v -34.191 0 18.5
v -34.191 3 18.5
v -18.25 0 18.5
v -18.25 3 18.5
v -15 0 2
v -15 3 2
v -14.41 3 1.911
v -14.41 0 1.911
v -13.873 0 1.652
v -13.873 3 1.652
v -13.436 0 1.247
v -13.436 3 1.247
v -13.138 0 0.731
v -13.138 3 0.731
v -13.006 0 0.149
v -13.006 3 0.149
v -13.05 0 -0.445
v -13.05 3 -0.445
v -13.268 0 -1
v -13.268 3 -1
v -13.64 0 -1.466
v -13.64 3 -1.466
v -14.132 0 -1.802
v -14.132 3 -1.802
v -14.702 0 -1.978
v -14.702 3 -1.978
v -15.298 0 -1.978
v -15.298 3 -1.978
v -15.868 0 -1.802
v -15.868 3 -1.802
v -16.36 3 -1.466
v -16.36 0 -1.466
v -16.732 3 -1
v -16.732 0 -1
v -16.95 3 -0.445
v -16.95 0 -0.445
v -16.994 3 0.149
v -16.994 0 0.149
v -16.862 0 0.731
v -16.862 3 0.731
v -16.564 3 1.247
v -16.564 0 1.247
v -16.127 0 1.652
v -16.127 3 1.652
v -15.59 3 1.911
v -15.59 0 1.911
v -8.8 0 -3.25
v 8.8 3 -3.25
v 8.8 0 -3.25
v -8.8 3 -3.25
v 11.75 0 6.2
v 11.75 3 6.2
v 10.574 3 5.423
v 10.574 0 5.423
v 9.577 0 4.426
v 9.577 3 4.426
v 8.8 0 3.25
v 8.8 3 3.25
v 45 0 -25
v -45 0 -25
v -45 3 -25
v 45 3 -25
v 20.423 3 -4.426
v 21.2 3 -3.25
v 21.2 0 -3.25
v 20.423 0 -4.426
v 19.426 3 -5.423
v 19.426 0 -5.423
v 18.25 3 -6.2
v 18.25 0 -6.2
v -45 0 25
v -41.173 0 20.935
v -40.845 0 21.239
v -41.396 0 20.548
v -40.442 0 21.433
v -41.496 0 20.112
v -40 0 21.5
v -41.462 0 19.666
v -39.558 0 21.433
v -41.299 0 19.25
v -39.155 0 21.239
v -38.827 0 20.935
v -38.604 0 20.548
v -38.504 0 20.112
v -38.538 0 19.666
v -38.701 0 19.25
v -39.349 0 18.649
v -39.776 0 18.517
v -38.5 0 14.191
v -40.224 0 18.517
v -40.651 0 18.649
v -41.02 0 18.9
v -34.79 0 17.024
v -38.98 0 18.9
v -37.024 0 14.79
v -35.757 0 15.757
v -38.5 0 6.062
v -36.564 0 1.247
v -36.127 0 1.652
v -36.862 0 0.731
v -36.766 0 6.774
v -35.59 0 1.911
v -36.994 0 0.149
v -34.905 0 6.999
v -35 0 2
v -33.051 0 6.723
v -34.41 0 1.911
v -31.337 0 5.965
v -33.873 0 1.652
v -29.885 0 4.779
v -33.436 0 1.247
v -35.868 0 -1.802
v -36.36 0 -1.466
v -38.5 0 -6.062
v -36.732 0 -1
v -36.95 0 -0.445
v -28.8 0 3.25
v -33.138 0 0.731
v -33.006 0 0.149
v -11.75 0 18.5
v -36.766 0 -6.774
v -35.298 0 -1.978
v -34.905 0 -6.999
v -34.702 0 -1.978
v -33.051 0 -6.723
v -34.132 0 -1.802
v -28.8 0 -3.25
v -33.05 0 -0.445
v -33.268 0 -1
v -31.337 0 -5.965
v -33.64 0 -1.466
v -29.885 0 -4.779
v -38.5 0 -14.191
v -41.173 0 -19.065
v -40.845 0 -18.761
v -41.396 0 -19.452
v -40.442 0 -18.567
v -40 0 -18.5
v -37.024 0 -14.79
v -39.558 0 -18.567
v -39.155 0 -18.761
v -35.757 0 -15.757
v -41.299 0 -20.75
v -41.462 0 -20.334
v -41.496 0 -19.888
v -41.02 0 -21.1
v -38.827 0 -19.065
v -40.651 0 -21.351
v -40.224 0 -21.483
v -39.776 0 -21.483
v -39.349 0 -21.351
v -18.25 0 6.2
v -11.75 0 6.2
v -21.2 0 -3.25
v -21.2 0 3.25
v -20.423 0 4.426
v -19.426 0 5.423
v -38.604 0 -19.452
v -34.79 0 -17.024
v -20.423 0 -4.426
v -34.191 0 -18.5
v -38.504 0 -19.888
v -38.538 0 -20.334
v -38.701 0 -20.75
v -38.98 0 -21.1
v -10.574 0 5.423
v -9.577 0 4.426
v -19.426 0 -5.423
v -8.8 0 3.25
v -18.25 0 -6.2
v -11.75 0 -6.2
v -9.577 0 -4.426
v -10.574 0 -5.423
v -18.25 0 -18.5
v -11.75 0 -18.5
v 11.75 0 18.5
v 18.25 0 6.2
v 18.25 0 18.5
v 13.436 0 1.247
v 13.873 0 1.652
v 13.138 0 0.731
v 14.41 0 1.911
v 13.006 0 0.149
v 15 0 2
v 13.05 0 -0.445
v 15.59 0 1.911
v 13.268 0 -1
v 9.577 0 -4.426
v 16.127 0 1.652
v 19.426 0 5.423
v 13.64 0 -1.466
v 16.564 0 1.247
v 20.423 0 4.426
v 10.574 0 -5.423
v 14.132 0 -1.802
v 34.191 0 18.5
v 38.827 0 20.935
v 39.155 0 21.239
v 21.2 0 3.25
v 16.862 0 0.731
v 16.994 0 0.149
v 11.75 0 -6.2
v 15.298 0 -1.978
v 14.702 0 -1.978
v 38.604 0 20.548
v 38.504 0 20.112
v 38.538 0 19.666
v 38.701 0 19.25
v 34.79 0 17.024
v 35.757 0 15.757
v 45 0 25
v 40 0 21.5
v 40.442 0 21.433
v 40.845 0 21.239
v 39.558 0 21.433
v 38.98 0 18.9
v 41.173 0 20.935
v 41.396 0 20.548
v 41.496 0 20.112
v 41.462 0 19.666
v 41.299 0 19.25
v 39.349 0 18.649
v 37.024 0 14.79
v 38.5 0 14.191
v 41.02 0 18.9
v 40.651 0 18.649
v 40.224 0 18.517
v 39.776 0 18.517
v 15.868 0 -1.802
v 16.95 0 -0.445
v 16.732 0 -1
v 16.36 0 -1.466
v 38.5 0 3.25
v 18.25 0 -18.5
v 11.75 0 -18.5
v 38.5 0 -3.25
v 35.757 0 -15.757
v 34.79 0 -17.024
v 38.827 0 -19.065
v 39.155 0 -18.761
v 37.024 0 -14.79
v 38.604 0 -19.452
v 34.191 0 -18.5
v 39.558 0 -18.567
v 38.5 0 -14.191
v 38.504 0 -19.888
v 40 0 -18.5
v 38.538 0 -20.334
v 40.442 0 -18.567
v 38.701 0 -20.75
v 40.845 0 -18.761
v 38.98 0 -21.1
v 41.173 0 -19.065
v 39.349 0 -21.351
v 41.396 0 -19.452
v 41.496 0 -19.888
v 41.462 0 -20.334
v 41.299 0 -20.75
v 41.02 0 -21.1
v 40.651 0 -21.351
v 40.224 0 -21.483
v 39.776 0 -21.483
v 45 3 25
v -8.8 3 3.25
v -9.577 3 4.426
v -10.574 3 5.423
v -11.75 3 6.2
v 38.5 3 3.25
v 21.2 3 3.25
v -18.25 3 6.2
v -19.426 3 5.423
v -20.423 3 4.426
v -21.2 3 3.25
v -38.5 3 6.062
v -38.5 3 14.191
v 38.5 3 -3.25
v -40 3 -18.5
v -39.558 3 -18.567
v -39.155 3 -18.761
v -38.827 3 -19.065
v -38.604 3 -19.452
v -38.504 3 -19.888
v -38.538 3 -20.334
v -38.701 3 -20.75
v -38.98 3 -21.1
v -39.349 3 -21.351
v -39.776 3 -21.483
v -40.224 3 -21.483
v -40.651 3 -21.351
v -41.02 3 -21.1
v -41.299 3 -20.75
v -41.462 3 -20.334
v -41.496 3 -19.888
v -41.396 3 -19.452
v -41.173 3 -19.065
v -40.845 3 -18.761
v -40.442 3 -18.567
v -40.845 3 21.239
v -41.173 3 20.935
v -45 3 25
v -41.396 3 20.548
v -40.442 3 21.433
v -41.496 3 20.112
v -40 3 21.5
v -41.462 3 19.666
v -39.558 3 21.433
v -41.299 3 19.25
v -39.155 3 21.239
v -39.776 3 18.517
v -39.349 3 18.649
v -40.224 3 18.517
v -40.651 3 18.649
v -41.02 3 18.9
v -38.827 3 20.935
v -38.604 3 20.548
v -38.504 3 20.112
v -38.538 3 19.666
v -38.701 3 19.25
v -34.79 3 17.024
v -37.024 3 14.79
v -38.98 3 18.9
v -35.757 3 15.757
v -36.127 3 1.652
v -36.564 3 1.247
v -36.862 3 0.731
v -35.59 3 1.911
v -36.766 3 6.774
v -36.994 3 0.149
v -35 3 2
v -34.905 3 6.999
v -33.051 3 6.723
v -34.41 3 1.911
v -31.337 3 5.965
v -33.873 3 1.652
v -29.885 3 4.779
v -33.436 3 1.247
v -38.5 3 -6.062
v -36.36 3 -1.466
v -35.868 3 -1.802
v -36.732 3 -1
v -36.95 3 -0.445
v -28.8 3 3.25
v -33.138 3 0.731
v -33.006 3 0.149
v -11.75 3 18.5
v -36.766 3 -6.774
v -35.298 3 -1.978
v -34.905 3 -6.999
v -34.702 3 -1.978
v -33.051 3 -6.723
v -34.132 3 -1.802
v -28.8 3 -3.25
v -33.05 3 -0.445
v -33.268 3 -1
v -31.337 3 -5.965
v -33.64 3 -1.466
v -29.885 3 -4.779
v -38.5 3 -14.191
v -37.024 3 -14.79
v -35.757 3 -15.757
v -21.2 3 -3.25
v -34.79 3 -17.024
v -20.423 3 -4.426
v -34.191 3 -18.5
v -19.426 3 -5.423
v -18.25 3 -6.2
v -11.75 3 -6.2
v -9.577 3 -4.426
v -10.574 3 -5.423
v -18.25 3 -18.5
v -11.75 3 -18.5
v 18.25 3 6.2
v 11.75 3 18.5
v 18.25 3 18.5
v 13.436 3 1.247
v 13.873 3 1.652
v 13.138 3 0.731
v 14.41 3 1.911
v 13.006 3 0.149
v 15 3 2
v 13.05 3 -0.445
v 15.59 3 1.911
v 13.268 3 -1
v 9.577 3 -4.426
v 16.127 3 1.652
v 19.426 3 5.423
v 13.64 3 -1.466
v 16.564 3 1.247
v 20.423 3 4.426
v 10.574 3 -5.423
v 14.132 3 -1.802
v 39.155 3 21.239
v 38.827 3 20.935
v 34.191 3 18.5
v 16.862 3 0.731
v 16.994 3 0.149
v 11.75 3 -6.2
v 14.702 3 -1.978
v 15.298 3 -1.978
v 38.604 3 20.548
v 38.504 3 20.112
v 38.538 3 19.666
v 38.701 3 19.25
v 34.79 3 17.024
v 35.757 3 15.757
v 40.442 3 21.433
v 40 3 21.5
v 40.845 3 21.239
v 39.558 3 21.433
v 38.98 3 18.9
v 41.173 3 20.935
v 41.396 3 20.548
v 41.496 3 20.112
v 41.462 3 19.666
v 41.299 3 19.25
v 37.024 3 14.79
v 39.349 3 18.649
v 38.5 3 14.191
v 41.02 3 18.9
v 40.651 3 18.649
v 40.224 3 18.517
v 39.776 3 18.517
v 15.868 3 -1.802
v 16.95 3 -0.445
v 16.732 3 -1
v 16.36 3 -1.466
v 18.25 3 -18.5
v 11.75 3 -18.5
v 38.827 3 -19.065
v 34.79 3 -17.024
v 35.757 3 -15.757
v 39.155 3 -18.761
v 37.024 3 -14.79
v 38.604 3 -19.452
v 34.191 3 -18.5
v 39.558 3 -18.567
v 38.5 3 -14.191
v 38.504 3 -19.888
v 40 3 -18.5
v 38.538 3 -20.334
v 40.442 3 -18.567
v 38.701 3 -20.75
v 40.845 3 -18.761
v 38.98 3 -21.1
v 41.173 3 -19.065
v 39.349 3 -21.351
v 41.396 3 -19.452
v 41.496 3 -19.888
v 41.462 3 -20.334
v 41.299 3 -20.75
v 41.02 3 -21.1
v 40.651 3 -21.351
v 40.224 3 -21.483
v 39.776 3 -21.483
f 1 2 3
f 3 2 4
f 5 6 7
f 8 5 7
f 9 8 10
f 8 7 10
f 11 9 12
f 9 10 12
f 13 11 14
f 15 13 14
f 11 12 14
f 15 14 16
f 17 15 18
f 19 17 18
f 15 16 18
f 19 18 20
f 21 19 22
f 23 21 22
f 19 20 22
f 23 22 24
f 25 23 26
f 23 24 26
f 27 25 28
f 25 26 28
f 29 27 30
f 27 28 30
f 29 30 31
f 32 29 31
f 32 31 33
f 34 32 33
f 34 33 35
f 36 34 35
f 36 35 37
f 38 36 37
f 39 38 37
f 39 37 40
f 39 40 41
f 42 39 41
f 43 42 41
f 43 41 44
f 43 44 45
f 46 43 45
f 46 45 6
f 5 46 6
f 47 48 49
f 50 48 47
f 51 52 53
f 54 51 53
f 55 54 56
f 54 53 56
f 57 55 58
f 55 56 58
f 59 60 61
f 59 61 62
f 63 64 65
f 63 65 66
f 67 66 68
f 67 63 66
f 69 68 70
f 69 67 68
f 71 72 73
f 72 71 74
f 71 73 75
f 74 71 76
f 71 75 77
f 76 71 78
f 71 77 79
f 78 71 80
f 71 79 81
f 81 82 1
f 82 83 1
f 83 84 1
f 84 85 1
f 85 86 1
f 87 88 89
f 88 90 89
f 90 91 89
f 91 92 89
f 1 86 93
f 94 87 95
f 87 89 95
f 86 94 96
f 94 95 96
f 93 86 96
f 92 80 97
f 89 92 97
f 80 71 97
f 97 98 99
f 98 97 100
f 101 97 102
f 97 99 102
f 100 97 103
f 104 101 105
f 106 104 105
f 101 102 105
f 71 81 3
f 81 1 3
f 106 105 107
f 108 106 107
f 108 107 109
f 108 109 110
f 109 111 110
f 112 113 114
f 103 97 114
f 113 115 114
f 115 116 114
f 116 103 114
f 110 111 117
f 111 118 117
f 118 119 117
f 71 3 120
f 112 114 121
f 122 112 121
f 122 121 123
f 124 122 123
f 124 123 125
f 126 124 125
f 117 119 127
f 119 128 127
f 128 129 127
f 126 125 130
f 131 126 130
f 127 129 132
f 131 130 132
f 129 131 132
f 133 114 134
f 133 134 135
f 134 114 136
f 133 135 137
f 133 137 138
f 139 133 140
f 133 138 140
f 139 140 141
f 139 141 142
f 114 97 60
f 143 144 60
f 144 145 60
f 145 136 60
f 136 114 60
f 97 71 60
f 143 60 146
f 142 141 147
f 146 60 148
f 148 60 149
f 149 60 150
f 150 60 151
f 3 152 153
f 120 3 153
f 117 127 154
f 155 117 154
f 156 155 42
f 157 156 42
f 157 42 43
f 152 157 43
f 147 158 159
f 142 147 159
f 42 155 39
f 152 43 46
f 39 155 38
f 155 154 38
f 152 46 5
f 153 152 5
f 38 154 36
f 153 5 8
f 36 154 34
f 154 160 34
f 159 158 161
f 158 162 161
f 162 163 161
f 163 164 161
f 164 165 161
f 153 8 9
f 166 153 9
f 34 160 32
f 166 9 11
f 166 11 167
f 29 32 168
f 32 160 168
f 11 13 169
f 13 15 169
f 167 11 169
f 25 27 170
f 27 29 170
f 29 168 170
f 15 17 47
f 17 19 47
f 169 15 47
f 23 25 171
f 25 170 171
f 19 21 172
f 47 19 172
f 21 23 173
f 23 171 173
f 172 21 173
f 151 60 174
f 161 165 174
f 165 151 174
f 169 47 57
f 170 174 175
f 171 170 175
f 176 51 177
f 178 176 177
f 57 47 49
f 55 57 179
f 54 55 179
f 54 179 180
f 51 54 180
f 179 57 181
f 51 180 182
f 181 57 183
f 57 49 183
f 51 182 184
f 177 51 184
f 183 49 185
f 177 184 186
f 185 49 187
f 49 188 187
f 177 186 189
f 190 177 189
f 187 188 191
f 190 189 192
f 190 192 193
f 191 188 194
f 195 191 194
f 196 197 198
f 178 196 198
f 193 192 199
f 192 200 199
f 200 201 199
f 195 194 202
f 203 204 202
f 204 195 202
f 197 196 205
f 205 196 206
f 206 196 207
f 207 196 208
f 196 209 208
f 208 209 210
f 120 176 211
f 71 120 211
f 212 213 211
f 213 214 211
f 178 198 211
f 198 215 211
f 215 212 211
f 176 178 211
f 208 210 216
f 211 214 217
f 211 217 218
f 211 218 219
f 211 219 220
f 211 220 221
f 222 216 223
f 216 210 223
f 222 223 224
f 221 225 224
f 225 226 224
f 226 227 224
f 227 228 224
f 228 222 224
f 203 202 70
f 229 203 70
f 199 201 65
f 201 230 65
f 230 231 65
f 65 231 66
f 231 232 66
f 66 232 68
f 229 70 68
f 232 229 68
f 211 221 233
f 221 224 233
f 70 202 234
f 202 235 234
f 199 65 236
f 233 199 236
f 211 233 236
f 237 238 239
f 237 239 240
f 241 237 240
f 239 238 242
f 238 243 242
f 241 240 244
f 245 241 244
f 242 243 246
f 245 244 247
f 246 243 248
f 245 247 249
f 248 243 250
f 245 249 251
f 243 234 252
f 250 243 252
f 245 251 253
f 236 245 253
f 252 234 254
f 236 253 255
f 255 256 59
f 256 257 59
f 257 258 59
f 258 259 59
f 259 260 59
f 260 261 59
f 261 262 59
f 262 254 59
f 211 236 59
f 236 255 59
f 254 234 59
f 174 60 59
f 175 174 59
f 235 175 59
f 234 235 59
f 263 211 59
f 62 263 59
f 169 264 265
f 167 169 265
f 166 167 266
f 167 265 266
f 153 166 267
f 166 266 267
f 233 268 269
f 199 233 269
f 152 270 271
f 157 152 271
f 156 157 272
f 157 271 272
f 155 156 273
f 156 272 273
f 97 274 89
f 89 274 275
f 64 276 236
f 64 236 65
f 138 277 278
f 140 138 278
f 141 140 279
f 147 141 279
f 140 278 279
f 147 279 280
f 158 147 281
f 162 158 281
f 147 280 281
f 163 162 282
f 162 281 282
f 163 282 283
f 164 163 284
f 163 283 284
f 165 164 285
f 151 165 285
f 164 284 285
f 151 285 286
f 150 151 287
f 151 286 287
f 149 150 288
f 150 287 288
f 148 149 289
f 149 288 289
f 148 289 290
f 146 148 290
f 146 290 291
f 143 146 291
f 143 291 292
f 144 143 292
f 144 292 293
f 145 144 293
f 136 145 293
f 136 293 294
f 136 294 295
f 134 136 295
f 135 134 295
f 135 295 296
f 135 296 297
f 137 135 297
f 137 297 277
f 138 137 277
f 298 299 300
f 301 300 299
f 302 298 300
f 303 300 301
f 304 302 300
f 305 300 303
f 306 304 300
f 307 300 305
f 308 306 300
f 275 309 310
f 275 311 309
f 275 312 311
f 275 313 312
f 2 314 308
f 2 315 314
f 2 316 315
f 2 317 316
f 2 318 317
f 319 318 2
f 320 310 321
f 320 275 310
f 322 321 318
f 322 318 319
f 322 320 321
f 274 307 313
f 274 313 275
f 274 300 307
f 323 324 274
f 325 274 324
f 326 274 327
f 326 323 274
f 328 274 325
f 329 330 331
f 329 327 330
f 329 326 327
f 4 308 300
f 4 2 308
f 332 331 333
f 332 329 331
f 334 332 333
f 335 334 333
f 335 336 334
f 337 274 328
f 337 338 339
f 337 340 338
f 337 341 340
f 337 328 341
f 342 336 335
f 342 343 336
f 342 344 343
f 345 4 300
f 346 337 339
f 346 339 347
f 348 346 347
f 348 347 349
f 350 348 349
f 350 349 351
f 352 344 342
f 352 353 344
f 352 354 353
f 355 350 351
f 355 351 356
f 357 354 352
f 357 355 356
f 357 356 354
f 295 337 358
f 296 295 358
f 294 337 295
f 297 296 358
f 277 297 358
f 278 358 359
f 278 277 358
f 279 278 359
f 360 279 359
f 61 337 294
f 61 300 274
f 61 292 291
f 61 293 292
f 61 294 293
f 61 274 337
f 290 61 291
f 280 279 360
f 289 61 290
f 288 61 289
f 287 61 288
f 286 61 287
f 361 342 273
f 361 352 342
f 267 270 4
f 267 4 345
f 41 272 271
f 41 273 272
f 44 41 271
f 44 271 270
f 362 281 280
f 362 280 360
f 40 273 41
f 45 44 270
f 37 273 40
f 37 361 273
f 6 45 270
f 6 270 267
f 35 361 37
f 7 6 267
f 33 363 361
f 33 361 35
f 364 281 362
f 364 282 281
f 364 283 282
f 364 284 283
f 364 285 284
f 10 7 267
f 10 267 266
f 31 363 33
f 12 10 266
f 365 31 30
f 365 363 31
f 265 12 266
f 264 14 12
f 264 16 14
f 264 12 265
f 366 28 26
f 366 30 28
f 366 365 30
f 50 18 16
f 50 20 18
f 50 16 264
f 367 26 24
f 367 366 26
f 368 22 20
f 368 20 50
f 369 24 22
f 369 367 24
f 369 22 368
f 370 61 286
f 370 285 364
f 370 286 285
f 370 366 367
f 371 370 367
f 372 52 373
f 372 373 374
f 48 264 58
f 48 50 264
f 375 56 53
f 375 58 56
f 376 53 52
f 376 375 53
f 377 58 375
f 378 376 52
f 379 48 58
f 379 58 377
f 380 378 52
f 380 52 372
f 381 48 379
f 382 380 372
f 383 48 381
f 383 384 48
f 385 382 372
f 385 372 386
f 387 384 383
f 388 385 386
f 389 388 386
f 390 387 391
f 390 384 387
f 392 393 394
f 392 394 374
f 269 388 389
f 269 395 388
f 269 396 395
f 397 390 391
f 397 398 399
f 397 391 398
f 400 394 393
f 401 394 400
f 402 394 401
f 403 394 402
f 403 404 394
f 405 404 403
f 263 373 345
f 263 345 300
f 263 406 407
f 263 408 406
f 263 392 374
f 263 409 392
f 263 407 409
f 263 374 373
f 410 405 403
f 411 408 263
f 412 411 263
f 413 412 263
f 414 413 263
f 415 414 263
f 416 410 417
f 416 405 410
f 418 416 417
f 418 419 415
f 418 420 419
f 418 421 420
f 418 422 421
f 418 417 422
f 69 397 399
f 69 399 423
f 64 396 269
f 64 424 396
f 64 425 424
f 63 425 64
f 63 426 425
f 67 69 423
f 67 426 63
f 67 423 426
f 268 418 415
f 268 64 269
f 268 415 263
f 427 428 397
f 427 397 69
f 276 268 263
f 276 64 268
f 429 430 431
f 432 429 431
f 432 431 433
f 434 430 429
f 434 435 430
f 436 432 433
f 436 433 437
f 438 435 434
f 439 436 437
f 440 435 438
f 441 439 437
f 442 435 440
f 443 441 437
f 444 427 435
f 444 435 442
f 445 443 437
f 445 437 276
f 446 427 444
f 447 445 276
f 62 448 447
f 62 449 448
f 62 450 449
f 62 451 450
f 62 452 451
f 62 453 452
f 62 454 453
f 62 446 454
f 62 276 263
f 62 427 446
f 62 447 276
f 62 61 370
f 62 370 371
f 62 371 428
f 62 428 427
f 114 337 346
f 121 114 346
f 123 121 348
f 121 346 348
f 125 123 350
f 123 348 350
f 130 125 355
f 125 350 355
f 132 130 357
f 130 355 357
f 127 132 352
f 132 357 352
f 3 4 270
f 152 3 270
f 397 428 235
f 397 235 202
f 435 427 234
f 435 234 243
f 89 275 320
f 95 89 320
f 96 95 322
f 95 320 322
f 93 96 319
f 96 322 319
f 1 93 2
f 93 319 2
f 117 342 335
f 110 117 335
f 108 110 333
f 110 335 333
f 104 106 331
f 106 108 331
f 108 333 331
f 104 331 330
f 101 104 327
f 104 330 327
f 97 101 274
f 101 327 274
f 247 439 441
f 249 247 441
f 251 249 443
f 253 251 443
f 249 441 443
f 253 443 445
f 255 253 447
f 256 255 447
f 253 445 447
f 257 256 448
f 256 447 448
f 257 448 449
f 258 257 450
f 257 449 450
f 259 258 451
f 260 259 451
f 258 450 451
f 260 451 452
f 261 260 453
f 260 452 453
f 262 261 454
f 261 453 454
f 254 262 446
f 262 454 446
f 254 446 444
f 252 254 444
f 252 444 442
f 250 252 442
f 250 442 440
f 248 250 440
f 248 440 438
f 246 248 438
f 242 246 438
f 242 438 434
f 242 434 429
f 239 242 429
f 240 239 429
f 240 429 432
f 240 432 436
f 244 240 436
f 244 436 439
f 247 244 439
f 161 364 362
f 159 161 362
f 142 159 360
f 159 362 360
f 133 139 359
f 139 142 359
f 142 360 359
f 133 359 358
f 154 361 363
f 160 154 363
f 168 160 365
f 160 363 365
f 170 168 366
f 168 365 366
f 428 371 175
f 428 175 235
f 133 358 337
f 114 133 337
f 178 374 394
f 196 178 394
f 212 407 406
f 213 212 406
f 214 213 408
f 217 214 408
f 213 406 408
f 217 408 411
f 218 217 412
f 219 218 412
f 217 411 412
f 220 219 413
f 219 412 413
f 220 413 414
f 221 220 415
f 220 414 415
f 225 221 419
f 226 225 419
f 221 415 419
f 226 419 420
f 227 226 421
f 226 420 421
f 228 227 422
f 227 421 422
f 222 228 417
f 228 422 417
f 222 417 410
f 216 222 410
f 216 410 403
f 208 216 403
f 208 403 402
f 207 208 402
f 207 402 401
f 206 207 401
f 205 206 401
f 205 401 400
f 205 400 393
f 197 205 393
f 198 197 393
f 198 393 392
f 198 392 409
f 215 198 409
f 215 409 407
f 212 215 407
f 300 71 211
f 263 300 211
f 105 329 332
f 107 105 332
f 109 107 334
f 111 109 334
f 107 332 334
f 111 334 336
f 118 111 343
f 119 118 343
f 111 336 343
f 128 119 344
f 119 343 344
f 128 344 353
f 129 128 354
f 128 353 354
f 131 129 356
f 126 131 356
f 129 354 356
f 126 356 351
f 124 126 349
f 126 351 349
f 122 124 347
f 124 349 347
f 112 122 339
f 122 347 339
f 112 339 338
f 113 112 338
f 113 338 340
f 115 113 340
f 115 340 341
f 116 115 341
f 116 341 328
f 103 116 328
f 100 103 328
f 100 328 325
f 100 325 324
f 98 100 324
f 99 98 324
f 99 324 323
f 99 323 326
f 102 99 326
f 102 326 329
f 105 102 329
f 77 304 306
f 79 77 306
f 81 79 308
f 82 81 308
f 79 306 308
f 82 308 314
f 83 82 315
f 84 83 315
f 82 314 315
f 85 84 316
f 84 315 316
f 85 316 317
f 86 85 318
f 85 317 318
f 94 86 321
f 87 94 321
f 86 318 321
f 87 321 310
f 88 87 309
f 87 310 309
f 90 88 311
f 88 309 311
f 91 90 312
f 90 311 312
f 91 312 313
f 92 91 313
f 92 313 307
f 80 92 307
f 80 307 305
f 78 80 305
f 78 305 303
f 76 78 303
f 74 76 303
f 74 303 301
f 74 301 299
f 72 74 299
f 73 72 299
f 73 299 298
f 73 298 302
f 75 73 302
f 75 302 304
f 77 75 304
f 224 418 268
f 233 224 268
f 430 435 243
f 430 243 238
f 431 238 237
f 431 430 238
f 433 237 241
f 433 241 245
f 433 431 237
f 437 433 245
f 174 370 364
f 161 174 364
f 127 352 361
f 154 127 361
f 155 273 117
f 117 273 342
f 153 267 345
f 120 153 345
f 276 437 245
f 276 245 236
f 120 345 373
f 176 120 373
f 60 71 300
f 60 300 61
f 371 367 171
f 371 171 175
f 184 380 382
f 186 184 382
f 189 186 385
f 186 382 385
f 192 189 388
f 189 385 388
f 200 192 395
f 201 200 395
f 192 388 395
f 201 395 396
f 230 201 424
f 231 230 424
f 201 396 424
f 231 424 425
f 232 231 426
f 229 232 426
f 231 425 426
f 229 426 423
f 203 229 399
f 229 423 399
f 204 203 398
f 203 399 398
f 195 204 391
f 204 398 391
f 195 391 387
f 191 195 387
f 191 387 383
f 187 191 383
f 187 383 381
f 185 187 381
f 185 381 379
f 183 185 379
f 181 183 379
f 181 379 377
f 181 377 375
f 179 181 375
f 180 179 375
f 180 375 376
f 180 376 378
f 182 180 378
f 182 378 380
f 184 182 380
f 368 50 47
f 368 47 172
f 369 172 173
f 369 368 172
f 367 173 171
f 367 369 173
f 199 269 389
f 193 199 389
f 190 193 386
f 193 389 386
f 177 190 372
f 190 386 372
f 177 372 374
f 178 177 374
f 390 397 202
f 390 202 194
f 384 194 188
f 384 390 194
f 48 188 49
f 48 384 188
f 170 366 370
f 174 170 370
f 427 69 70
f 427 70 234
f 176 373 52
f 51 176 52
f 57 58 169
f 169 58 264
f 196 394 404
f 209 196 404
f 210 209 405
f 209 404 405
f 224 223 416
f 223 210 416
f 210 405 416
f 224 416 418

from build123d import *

# Parameters (mm, degrees)
SKETCH1_W           = 90
SKETCH1_H           = 50
BOSS_EXTRUDE1_DEPTH = 3
SKETCH3_R           = 2
CUT_EXTRUDE2_DEPTH  = 10
SKETCH2_R           = 1.5
CUT_EXTRUDE3_DEPTH  = 10


with BuildPart() as part:
    # Sketch1 → Boss-Extrude1 (new body)
    with BuildSketch(Plane(origin=(0, 0, 0), x_dir=(1, 0, 0), z_dir=(0, 1, 0))):
        Rectangle(SKETCH1_W, SKETCH1_H)
    extrude(amount=BOSS_EXTRUDE1_DEPTH)

    # Sketch3 → Cut-Extrude2 (cut)
    with BuildSketch(Plane(origin=(0, 3, 0), x_dir=(1, 0, 0), z_dir=(0, 1, 0))):
        with Locations(Location((-35, 0, 0), (0, 0, 270))):
            Circle(SKETCH3_R)
        with Locations(Location((-15, 0, 0), (0, 0, 270))):
            Circle(SKETCH3_R)
        with Locations(Location((15, 0, 0), (0, 0, 270))):
            Circle(SKETCH3_R)
    extrude(amount=-CUT_EXTRUDE2_DEPTH, mode=Mode.SUBTRACT)

    # Sketch2 → Cut-Extrude3 (cut)
    with BuildSketch(Plane(origin=(0, 3, 0), x_dir=(1, 0, 0), z_dir=(0, 1, 0))):
        with Locations(Location((-40, -20, 0), (0, 0, 270))):
            Circle(SKETCH2_R)
        with Locations(Location((40, -20, 0), (0, 0, 270))):
            Circle(SKETCH2_R)
        with Locations(Location((40, 20, 0), (0, 0, 270))):
            Circle(SKETCH2_R)
        with Locations(Location((-40, 20, 0), (0, 0, 270))):
            Circle(SKETCH2_R)
        with BuildLine():
            Line((38.5, -14.190524981), (38.5, -6.062177826))
            Line((38.5, -6.062177826), (38.5, -3.25))
            Line((38.5, -3.25), (28.800201616, -3.25))
            Line((28.800201616, -3.25), (21.199798384, -3.25))
            ThreePointArc((21.199798384, -3.25), (19.949747468, -4.949747468), (18.25, -6.199798384))
            Line((18.25, -6.199798384), (18.25, -18.5))
            Line((18.25, -18.5), (34.190524981, -18.5))
            ThreePointArc((34.190524981, -18.5), (35.757359313, -15.757359313), (38.5, -14.190524981))
        make_face()
        with BuildLine():
            Line((-34.190524981, -18.5), (-18.25, -18.5))
            Line((-18.25, -18.5), (-18.25, -6.199798384))
            ThreePointArc((-18.25, -6.199798384), (-19.949747468, -4.949747468), (-21.199798384, -3.25))
            Line((-21.199798384, -3.25), (-28.800201616, -3.25))
            ThreePointArc((-28.800201616, -3.25), (-33.05081713, -6.723145554), (-38.5, -6.062177826))
            Line((-38.5, -6.062177826), (-38.5, -14.190524981))
            ThreePointArc((-38.5, -14.190524981), (-35.757359313, -15.757359313), (-34.190524981, -18.5))
        make_face()
        with BuildLine():
            Line((38.5, 14.190524981), (38.5, 6.062177826))
            Line((38.5, 6.062177826), (38.5, 3.25))
            Line((38.5, 3.25), (28.800201616, 3.25))
            Line((28.800201616, 3.25), (21.199798384, 3.25))
            ThreePointArc((21.199798384, 3.25), (19.949747468, 4.949747468), (18.25, 6.199798384))
            Line((18.25, 6.199798384), (18.25, 18.5))
            Line((18.25, 18.5), (34.190524981, 18.5))
            ThreePointArc((34.190524981, 18.5), (35.757359313, 15.757359313), (38.5, 14.190524981))
        make_face()
        with BuildLine():
            Line((-38.5, 14.190524981), (-38.5, 6.062177826))
            ThreePointArc((-38.5, 6.062177826), (-33.05081713, 6.723145554), (-28.800201616, 3.25))
            Line((-28.800201616, 3.25), (-21.199798384, 3.25))
            ThreePointArc((-21.199798384, 3.25), (-19.949747468, 4.949747468), (-18.25, 6.199798384))
            Line((-18.25, 6.199798384), (-18.25, 18.5))
            Line((-18.25, 18.5), (-34.190524981, 18.5))
            ThreePointArc((-34.190524981, 18.5), (-35.757359313, 15.757359313), (-38.5, 14.190524981))
        make_face()
        with BuildLine():
            Line((-11.75, 18.5), (11.75, 18.5))
            Line((11.75, 18.5), (11.75, 6.199798384))
            ThreePointArc((11.75, 6.199798384), (10.050252532, 4.949747468), (8.800201616, 3.25))
            Line((8.800201616, 3.25), (-8.800201616, 3.25))
            ThreePointArc((-8.800201616, 3.25), (-10.050252532, 4.949747468), (-11.75, 6.199798384))
            Line((-11.75, 6.199798384), (-11.75, 18.5))
        make_face()
        with BuildLine():
            Line((-11.75, -18.5), (11.75, -18.5))
            Line((11.75, -18.5), (11.75, -6.199798384))
            ThreePointArc((11.75, -6.199798384), (10.050252532, -4.949747468), (8.800201616, -3.25))
            Line((8.800201616, -3.25), (-8.800201616, -3.25))
            ThreePointArc((-8.800201616, -3.25), (-10.050252532, -4.949747468), (-11.75, -6.199798384))
            Line((-11.75, -6.199798384), (-11.75, -18.5))
        make_face()
    extrude(amount=-CUT_EXTRUDE3_DEPTH, mode=Mode.SUBTRACT)


solid = part.part
